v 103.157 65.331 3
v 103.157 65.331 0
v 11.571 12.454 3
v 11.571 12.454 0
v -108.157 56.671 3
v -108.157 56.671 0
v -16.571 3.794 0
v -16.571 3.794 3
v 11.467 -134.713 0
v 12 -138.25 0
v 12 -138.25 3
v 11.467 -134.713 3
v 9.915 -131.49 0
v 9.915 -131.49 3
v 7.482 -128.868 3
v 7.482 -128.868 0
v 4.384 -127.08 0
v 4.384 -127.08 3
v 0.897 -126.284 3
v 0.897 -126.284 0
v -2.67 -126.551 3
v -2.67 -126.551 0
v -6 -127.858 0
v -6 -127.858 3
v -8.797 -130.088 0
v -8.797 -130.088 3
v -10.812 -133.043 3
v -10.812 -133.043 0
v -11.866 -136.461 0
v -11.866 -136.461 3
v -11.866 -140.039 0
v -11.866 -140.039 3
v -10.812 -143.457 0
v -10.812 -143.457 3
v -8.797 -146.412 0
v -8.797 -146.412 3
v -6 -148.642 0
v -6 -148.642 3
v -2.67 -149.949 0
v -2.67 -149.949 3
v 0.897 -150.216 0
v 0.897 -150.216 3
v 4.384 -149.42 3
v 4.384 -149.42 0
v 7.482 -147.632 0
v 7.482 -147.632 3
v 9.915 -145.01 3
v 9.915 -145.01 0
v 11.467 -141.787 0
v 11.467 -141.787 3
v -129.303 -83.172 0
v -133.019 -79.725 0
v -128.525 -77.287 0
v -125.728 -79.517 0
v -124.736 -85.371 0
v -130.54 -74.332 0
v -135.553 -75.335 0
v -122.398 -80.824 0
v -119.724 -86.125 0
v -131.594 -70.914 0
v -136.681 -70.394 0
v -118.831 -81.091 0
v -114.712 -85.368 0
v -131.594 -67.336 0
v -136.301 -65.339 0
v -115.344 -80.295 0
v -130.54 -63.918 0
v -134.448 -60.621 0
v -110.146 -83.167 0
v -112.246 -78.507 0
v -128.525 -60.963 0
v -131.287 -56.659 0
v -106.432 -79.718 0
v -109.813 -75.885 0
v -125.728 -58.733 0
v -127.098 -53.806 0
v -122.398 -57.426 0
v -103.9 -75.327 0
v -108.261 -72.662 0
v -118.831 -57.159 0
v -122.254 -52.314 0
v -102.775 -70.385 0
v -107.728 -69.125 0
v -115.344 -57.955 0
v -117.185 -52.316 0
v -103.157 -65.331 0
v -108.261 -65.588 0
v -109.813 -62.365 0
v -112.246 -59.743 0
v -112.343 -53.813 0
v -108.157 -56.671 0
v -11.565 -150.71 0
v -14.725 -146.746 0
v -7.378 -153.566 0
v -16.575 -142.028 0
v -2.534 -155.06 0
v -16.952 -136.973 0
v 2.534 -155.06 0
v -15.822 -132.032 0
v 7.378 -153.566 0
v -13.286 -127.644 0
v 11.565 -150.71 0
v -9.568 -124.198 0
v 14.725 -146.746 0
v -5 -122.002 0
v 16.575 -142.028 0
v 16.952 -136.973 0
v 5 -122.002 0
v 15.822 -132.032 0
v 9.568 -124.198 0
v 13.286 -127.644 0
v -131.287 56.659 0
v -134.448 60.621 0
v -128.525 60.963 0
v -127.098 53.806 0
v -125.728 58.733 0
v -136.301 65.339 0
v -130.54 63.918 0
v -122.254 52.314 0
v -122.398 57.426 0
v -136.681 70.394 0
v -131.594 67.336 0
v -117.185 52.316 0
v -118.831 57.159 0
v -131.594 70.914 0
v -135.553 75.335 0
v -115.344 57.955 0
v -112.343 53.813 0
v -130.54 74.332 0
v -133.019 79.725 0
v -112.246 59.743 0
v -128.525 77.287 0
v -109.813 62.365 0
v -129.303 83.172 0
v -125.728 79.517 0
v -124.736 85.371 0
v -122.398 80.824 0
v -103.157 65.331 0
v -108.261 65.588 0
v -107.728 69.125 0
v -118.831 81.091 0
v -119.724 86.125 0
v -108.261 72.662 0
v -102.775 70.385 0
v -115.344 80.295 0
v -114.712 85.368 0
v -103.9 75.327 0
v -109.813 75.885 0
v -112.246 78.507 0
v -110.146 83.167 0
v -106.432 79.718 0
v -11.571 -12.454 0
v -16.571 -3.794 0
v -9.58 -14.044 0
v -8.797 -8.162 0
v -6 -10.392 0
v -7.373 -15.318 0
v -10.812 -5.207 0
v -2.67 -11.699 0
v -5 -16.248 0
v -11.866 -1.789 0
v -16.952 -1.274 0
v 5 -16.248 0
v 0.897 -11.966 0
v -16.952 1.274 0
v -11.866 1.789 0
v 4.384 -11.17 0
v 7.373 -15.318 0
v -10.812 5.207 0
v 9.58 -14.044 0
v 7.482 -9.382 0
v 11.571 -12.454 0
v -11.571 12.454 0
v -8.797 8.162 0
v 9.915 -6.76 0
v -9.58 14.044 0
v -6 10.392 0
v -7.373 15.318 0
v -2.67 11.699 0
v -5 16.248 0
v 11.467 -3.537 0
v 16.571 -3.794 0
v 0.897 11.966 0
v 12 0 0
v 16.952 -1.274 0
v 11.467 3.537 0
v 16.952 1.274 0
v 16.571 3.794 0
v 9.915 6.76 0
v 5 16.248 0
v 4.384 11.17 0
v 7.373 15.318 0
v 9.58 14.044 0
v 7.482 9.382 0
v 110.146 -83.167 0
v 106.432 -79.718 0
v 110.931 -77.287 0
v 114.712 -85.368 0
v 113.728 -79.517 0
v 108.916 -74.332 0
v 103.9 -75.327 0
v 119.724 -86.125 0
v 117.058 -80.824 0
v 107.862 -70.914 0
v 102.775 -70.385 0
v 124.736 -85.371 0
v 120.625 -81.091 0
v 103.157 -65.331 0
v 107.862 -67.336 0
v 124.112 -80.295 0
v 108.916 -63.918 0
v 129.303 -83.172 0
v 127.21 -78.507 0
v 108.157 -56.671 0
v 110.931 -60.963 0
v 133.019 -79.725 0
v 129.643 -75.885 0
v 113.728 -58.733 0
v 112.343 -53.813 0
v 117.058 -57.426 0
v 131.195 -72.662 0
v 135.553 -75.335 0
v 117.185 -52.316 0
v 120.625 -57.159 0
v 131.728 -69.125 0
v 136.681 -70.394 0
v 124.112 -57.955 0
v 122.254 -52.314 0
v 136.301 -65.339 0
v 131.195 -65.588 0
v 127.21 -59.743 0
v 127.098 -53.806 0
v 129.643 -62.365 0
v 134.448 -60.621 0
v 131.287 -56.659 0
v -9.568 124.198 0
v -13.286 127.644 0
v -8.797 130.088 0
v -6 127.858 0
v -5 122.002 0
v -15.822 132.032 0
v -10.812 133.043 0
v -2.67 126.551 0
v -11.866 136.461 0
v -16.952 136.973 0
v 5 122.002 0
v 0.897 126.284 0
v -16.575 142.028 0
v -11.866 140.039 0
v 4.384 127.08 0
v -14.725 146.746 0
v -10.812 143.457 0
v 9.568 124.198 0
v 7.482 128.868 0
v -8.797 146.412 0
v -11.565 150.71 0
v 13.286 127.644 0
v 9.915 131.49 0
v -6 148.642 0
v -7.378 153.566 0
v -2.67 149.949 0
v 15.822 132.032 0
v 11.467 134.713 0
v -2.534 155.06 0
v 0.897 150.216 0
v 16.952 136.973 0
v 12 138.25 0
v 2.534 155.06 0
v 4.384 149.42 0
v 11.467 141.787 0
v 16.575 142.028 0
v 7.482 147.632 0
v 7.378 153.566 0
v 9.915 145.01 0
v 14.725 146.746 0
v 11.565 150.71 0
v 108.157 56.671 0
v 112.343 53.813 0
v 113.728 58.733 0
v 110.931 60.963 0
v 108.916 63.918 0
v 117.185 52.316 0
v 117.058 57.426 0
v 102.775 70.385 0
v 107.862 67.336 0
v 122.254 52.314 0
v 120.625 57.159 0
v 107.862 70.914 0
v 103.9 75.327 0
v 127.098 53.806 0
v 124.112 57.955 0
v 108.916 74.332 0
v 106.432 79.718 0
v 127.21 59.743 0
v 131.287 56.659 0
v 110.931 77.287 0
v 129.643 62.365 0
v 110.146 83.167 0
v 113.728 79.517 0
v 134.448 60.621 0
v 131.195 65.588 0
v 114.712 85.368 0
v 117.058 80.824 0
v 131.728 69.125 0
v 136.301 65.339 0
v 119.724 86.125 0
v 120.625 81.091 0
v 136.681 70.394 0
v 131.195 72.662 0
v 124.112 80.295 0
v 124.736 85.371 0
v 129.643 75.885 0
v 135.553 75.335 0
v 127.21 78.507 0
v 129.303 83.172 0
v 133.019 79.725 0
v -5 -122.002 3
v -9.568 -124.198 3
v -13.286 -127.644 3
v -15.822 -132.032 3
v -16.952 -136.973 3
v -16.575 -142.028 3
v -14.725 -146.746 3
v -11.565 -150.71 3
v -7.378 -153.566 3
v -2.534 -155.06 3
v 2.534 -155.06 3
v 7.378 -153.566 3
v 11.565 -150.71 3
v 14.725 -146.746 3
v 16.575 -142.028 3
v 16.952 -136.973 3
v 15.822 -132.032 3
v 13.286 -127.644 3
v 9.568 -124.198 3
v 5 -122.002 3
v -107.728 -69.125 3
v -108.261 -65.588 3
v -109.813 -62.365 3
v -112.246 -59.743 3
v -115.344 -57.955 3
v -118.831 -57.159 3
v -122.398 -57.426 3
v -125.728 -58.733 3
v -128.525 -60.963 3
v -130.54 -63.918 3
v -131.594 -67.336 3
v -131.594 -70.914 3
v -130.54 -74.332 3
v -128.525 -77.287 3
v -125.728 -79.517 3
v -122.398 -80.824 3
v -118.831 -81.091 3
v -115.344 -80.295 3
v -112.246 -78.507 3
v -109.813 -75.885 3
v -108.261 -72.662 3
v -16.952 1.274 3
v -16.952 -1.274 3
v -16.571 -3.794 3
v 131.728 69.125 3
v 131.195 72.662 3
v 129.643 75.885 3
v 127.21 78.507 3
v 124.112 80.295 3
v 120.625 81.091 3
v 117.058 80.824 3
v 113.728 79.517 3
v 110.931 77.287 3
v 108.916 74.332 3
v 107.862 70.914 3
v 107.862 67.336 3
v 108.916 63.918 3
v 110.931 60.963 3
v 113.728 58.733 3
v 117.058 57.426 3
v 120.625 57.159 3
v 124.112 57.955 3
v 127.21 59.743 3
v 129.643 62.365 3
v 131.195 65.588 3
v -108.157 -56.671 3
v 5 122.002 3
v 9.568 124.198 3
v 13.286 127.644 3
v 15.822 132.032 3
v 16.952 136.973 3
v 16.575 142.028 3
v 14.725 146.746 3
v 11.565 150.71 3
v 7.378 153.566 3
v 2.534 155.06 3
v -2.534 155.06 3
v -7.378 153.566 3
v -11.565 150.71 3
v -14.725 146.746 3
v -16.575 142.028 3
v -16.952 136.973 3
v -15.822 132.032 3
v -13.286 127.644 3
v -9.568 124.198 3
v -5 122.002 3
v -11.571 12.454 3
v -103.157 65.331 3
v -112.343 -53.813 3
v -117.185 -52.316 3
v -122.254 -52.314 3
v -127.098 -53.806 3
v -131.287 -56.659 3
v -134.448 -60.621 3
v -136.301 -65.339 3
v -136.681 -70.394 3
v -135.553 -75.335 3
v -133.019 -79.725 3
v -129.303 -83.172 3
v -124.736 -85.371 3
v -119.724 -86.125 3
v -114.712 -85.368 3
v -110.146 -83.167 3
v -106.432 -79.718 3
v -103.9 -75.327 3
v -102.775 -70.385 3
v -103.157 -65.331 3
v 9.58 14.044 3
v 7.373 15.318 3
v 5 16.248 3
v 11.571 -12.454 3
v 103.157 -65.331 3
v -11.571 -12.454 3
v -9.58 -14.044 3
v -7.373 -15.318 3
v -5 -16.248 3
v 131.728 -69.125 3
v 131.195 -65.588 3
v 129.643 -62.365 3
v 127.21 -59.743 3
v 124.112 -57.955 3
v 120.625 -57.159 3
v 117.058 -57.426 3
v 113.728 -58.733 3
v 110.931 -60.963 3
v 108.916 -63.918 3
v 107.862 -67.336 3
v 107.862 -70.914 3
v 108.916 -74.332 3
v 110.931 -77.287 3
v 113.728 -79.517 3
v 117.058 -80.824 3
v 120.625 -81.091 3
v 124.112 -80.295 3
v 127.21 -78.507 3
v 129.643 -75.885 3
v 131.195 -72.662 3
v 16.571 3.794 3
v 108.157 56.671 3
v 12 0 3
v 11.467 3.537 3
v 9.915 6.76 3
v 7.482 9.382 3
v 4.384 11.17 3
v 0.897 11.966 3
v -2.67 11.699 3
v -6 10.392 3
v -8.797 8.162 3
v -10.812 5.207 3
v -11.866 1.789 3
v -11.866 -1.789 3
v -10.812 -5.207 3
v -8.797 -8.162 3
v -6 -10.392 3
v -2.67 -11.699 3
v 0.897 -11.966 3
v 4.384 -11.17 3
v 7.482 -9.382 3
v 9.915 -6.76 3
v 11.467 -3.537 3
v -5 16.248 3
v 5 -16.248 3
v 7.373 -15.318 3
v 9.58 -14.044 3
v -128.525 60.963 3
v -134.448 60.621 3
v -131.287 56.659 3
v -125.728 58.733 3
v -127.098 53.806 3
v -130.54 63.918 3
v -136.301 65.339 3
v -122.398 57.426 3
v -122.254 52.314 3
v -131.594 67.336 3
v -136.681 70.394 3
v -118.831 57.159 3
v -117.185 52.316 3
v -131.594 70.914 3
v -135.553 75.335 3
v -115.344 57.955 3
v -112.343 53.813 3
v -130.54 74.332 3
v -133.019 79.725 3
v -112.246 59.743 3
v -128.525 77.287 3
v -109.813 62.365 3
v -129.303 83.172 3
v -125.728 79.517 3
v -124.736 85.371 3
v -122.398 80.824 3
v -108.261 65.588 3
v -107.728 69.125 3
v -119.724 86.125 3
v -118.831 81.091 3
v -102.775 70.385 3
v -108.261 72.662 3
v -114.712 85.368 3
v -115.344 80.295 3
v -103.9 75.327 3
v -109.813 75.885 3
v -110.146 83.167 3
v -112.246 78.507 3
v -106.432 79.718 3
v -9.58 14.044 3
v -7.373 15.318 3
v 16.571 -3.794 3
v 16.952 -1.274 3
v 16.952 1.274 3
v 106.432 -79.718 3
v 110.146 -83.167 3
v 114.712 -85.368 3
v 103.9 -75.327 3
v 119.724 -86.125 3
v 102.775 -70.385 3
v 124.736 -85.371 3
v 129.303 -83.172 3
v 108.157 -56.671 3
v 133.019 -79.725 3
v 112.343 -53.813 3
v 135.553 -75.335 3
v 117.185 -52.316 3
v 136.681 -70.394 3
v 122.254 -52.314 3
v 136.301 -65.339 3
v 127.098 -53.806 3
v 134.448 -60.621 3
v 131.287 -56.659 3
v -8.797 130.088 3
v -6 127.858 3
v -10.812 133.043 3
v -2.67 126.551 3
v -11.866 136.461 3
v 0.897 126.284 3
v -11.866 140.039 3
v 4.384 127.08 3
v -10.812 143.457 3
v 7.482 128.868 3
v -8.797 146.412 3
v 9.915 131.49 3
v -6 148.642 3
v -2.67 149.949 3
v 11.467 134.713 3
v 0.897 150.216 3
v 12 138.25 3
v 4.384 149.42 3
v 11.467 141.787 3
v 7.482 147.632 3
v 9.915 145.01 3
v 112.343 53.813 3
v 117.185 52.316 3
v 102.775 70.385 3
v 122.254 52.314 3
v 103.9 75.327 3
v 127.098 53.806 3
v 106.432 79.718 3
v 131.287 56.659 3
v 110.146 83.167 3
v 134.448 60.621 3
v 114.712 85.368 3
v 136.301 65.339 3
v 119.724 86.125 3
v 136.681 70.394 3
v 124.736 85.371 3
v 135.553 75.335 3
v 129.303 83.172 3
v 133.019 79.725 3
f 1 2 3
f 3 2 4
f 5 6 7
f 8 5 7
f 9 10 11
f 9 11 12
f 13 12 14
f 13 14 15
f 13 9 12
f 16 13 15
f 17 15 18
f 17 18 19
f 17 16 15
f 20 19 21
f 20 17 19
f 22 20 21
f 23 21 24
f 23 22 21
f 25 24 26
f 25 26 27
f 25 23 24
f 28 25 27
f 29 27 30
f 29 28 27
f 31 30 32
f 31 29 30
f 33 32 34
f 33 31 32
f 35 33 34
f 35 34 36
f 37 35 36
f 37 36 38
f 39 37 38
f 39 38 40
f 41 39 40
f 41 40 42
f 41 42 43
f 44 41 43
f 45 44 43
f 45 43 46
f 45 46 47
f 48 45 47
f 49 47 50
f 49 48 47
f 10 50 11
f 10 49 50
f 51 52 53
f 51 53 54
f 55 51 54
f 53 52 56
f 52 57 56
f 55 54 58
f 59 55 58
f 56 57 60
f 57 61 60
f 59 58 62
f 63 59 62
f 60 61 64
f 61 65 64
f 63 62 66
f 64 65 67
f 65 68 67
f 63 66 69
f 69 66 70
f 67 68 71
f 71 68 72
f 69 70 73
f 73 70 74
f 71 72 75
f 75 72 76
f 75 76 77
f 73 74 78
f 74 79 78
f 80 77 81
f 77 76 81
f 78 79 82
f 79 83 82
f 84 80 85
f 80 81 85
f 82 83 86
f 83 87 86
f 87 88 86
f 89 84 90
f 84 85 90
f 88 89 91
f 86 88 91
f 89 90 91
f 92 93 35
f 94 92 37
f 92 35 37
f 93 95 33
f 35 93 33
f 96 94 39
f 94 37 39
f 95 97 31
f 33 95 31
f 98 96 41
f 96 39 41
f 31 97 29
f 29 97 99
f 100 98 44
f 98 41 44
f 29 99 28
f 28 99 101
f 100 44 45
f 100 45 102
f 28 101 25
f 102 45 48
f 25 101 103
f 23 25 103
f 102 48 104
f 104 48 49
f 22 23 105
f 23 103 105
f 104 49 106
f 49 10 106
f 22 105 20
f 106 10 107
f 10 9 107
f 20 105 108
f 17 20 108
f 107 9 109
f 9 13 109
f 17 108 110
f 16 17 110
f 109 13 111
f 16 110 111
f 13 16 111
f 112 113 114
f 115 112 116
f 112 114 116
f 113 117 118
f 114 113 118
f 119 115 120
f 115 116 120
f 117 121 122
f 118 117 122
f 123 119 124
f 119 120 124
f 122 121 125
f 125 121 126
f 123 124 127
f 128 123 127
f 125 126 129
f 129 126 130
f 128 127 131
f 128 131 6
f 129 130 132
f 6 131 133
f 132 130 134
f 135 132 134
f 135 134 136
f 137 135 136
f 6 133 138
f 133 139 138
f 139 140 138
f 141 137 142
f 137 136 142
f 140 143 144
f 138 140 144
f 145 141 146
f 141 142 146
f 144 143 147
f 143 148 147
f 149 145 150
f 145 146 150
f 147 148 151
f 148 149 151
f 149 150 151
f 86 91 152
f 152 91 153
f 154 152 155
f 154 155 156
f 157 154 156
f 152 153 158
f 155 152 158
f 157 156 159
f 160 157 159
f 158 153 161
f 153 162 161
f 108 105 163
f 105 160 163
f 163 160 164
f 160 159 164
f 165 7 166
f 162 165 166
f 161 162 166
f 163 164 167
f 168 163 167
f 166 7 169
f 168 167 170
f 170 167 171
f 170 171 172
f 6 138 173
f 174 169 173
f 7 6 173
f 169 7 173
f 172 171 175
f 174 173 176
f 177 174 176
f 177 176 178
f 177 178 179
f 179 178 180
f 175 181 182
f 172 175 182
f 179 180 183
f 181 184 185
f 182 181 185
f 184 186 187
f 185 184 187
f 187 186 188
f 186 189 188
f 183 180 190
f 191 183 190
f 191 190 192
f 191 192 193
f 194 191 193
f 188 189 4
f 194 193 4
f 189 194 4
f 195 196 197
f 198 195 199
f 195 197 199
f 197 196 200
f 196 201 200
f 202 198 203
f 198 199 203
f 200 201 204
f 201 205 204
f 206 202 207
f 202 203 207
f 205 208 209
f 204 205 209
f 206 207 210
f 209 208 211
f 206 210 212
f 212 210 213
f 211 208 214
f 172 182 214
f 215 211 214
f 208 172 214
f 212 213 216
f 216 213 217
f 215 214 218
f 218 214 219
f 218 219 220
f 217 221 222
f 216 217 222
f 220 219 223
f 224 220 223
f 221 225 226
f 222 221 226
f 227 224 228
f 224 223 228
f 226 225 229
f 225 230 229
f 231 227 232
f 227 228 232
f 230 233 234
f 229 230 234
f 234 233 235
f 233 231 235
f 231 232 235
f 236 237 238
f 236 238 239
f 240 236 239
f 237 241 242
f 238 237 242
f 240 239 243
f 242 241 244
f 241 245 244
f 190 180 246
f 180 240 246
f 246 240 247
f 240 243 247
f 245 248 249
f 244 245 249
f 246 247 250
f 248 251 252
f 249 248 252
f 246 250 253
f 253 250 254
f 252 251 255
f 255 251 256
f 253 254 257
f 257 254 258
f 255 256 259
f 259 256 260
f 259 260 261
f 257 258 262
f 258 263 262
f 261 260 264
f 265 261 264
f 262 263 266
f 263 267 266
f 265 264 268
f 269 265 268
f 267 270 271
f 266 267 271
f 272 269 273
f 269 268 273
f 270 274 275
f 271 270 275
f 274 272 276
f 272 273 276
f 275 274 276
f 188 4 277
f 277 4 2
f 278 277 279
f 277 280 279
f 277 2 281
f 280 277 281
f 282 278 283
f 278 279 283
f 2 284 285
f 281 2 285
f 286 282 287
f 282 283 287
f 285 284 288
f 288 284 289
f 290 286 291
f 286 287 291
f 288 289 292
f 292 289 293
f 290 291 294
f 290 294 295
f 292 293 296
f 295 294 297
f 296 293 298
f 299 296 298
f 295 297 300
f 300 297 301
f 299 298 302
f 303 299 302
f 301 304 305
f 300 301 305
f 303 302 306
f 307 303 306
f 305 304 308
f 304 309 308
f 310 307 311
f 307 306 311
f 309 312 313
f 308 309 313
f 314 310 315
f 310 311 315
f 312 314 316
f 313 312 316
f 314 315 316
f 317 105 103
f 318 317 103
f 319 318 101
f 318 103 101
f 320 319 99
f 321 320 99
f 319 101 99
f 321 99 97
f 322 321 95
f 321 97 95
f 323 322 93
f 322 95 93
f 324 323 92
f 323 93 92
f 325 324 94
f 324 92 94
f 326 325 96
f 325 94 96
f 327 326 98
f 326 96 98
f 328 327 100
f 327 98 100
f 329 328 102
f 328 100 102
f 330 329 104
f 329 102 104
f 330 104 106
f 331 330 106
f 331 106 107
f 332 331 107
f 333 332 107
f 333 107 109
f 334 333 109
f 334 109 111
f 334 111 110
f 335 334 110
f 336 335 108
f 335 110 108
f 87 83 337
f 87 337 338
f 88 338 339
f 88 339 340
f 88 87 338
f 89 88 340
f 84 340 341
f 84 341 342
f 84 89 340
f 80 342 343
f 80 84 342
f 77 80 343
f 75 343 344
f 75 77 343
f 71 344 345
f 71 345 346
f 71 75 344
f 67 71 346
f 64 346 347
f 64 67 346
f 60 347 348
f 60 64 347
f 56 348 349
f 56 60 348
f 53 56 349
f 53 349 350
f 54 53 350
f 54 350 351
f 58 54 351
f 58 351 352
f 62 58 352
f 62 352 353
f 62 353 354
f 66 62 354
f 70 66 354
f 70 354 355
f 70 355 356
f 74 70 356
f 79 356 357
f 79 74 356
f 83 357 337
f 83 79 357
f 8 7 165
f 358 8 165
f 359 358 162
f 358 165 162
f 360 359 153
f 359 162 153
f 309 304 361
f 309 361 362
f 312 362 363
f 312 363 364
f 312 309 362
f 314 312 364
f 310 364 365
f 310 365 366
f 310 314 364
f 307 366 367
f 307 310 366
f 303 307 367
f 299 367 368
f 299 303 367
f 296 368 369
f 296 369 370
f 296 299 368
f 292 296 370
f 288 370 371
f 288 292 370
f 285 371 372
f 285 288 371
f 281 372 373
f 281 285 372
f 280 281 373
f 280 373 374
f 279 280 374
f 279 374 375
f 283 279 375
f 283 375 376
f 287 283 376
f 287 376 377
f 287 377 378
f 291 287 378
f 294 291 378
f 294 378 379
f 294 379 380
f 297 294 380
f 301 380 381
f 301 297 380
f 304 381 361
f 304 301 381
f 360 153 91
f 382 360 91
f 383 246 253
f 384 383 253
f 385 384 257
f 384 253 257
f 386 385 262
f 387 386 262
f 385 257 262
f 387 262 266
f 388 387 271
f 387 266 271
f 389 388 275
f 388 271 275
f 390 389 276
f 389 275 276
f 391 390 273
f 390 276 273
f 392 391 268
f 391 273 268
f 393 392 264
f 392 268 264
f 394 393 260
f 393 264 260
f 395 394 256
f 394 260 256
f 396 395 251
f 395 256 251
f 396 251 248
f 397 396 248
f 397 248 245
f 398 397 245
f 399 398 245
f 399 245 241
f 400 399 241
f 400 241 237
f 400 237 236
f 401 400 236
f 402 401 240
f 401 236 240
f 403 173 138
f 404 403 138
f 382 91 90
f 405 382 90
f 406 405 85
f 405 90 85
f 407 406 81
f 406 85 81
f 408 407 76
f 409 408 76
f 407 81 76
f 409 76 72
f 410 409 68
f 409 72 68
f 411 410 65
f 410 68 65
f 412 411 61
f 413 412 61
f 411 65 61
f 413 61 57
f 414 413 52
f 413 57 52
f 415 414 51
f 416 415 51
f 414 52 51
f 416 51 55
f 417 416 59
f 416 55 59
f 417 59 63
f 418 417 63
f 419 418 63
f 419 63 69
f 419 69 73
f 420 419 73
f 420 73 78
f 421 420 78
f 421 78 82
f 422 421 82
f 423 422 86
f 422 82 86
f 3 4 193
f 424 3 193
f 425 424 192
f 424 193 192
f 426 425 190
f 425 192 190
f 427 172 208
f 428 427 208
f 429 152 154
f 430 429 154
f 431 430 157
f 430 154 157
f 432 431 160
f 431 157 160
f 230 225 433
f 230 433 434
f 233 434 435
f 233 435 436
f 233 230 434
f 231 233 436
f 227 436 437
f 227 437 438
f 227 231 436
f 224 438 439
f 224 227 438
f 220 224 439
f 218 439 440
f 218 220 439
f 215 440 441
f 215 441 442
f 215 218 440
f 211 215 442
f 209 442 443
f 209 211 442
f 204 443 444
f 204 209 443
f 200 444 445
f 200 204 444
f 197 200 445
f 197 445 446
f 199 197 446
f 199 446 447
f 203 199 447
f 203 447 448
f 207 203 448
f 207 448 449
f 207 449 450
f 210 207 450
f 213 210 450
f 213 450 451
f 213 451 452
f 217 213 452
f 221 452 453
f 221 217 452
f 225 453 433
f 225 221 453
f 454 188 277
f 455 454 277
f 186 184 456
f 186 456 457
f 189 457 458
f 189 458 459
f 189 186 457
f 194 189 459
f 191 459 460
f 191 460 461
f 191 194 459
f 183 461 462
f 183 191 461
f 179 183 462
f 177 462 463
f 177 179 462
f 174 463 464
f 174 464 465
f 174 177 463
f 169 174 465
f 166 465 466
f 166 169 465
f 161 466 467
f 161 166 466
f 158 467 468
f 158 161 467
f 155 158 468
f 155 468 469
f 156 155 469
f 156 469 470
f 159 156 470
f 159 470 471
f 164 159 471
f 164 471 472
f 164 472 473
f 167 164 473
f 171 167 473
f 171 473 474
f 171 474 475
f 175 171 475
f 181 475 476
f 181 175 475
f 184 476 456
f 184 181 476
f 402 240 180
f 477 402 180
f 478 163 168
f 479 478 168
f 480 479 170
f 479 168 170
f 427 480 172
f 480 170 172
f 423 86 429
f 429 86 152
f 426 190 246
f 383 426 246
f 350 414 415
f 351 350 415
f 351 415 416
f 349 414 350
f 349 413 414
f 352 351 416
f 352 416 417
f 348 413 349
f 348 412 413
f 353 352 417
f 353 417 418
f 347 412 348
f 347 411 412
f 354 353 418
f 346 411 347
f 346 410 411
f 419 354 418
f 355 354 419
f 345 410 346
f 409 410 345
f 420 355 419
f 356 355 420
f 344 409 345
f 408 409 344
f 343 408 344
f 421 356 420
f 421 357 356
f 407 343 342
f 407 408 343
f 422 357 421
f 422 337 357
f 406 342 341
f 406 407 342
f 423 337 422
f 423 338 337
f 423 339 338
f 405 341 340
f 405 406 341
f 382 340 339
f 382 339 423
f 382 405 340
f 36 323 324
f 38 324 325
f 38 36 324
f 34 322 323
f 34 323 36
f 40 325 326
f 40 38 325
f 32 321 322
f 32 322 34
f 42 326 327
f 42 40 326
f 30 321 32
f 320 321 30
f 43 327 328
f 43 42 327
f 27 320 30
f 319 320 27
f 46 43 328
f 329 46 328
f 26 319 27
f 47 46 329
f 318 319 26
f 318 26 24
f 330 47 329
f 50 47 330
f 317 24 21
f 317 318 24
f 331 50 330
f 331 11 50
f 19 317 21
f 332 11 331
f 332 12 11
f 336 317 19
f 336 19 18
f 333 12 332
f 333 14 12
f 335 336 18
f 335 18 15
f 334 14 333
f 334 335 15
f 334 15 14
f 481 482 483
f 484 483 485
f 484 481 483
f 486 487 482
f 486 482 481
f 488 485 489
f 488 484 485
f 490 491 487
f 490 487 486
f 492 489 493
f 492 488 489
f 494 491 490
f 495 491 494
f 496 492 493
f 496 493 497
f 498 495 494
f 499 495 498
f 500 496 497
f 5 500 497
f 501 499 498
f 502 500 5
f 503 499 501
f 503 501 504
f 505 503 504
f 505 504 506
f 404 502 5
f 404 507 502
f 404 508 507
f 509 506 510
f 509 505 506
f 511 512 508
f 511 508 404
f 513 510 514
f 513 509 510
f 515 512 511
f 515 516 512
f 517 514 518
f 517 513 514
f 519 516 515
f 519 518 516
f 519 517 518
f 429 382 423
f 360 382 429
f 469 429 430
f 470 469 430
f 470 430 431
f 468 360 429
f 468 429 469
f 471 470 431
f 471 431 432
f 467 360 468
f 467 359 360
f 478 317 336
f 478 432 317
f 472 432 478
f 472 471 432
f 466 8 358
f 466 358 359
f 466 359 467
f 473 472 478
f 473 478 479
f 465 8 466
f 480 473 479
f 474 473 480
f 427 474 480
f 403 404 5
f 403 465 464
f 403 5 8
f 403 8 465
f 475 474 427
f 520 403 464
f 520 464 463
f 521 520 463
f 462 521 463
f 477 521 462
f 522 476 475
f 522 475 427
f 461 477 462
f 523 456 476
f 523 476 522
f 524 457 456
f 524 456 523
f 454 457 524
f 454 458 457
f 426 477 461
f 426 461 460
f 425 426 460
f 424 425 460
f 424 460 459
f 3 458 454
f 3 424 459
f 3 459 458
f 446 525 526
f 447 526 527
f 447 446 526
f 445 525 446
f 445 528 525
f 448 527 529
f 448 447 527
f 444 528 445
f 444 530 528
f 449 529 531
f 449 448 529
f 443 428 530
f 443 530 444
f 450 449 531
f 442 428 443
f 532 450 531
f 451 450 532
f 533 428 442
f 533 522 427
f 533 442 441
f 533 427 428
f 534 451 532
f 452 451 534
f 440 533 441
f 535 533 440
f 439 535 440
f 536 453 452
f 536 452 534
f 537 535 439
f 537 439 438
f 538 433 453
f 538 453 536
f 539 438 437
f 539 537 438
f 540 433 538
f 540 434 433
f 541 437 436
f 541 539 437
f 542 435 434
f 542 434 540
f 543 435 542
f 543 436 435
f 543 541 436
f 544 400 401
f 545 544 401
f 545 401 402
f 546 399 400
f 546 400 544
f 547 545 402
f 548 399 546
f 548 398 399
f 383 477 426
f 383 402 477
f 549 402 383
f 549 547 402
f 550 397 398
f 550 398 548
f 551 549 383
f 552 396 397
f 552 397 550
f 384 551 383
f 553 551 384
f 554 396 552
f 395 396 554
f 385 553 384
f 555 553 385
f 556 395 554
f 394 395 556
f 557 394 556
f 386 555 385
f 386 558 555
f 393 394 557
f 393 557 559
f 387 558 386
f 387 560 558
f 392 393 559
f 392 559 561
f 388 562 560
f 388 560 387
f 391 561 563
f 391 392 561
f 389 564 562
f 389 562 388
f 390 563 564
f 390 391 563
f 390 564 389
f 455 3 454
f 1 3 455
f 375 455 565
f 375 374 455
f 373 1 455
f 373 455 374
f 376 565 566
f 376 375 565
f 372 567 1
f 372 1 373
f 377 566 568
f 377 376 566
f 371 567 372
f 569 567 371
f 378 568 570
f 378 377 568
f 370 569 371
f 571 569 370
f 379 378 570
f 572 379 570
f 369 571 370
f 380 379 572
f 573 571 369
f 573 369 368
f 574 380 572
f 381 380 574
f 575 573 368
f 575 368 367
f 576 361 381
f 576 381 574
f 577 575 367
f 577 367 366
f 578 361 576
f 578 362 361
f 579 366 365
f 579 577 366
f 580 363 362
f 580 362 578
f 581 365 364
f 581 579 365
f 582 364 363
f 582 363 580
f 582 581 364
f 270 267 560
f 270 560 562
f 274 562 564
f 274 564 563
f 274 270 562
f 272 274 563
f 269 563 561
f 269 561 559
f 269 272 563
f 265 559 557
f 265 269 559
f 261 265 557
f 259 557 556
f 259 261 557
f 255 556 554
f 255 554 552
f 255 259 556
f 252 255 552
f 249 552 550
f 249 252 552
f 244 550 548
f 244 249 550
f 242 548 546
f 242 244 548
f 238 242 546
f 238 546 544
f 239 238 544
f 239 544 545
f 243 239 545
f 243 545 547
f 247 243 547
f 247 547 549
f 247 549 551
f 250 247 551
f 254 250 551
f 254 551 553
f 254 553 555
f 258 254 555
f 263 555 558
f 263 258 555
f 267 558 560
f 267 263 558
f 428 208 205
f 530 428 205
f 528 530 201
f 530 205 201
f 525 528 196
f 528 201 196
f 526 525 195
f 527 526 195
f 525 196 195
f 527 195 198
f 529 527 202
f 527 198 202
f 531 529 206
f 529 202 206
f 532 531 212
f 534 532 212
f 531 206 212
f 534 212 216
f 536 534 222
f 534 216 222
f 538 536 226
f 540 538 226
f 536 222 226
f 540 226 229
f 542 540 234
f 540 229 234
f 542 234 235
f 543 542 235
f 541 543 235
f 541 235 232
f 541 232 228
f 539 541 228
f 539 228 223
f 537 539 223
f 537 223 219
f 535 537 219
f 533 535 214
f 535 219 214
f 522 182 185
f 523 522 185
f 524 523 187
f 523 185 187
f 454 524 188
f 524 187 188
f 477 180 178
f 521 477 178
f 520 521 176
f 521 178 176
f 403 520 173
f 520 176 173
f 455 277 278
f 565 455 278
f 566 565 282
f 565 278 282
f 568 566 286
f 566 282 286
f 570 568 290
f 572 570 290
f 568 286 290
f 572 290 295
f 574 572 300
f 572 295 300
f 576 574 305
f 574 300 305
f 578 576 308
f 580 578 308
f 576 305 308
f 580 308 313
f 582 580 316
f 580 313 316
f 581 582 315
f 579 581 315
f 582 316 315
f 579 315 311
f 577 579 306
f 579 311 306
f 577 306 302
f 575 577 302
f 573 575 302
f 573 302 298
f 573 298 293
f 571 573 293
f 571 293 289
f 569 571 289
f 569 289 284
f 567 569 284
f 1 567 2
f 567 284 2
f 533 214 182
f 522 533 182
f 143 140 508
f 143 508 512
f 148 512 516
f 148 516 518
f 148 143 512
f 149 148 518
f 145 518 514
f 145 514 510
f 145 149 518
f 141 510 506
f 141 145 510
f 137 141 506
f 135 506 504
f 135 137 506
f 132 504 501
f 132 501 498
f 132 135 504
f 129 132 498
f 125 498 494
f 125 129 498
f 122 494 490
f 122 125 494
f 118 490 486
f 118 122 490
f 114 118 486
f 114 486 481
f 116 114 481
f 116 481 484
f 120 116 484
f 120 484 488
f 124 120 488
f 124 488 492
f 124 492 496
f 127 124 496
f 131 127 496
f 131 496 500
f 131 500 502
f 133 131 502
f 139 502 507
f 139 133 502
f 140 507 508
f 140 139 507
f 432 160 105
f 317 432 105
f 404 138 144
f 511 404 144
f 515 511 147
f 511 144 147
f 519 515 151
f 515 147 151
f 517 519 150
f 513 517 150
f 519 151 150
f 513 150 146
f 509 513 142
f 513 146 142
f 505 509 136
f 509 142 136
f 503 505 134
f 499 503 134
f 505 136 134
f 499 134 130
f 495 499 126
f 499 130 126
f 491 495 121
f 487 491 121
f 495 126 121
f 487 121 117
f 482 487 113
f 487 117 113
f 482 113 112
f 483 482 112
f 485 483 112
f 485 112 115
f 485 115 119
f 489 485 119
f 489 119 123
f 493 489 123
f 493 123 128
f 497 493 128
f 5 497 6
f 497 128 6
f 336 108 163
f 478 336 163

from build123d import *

# Parameters (mm, degrees)
F0_R     = 12
F1_DEPTH = 3


with BuildPart() as f1:
    # F0 (on Top) → F1 (new body)
    with BuildSketch(Plane.XY):
        with BuildLine():
            Line((5, 16.248077), (5, 122.001923))
            ThreePointArc((5, 122.001923), (0, 155.25), (-5, 122.001923))
            Line((-5, 122.001923), (-5, 16.248077))
            ThreePointArc((-5, 16.248077), (-8.5, 14.722432), (-11.571247, 12.454165))
            Line((-11.571247, 12.454165), (-103.156765, 65.331089))
            ThreePointArc((-103.156765, 65.331089), (-134.450444, 77.625), (-108.156765, 56.670835))
            Line((-108.156765, 56.670835), (-16.571247, 3.793911))
            ThreePointArc((-16.571247, 3.793911), (-17, 0), (-16.571247, -3.793911))
            Line((-16.571247, -3.793911), (-108.156765, -56.670835))
            ThreePointArc((-108.156765, -56.670835), (-134.450444, -77.625), (-103.156765, -65.331089))
            Line((-103.156765, -65.331089), (-11.571247, -12.454165))
            ThreePointArc((-11.571247, -12.454165), (-8.5, -14.722432), (-5, -16.248077))
            Line((-5, -16.248077), (-5, -122.001923))
            ThreePointArc((-5, -122.001923), (0, -155.25), (5, -122.001923))
            Line((5, -122.001923), (5, -16.248077))
            ThreePointArc((5, -16.248077), (8.5, -14.722432), (11.571247, -12.454165))
            Line((11.571247, -12.454165), (103.156765, -65.331089))
            ThreePointArc((103.156765, -65.331089), (134.450444, -77.625), (108.156765, -56.670835))
            Line((108.156765, -56.670835), (16.571247, -3.793911))
            ThreePointArc((16.571247, -3.793911), (17, 0), (16.571247, 3.793911))
            Line((16.571247, 3.793911), (108.156765, 56.670835))
            ThreePointArc((108.156765, 56.670835), (134.450444, 77.625), (103.156765, 65.331089))
            Line((103.156765, 65.331089), (11.571247, 12.454165))
            ThreePointArc((11.571247, 12.454165), (8.5, 14.722432), (5, 16.248077))
        make_face()
        with Locations((-119.728012, -69.125)):
            Circle(F0_R, mode=Mode.SUBTRACT)
        with Locations((0, -138.25)):
            Circle(F0_R, mode=Mode.SUBTRACT)
        with Locations((119.728012, -69.125)):
            Circle(F0_R, mode=Mode.SUBTRACT)
        with Locations((-119.728012, 69.125)):
            Circle(F0_R, mode=Mode.SUBTRACT)
        Circle(F0_R, mode=Mode.SUBTRACT)
        with Locations((119.728012, 69.125)):
            Circle(F0_R, mode=Mode.SUBTRACT)
        with Locations((0, 138.25)):
            Circle(F0_R, mode=Mode.SUBTRACT)
    extrude(amount=F1_DEPTH)


solid = f1.part
